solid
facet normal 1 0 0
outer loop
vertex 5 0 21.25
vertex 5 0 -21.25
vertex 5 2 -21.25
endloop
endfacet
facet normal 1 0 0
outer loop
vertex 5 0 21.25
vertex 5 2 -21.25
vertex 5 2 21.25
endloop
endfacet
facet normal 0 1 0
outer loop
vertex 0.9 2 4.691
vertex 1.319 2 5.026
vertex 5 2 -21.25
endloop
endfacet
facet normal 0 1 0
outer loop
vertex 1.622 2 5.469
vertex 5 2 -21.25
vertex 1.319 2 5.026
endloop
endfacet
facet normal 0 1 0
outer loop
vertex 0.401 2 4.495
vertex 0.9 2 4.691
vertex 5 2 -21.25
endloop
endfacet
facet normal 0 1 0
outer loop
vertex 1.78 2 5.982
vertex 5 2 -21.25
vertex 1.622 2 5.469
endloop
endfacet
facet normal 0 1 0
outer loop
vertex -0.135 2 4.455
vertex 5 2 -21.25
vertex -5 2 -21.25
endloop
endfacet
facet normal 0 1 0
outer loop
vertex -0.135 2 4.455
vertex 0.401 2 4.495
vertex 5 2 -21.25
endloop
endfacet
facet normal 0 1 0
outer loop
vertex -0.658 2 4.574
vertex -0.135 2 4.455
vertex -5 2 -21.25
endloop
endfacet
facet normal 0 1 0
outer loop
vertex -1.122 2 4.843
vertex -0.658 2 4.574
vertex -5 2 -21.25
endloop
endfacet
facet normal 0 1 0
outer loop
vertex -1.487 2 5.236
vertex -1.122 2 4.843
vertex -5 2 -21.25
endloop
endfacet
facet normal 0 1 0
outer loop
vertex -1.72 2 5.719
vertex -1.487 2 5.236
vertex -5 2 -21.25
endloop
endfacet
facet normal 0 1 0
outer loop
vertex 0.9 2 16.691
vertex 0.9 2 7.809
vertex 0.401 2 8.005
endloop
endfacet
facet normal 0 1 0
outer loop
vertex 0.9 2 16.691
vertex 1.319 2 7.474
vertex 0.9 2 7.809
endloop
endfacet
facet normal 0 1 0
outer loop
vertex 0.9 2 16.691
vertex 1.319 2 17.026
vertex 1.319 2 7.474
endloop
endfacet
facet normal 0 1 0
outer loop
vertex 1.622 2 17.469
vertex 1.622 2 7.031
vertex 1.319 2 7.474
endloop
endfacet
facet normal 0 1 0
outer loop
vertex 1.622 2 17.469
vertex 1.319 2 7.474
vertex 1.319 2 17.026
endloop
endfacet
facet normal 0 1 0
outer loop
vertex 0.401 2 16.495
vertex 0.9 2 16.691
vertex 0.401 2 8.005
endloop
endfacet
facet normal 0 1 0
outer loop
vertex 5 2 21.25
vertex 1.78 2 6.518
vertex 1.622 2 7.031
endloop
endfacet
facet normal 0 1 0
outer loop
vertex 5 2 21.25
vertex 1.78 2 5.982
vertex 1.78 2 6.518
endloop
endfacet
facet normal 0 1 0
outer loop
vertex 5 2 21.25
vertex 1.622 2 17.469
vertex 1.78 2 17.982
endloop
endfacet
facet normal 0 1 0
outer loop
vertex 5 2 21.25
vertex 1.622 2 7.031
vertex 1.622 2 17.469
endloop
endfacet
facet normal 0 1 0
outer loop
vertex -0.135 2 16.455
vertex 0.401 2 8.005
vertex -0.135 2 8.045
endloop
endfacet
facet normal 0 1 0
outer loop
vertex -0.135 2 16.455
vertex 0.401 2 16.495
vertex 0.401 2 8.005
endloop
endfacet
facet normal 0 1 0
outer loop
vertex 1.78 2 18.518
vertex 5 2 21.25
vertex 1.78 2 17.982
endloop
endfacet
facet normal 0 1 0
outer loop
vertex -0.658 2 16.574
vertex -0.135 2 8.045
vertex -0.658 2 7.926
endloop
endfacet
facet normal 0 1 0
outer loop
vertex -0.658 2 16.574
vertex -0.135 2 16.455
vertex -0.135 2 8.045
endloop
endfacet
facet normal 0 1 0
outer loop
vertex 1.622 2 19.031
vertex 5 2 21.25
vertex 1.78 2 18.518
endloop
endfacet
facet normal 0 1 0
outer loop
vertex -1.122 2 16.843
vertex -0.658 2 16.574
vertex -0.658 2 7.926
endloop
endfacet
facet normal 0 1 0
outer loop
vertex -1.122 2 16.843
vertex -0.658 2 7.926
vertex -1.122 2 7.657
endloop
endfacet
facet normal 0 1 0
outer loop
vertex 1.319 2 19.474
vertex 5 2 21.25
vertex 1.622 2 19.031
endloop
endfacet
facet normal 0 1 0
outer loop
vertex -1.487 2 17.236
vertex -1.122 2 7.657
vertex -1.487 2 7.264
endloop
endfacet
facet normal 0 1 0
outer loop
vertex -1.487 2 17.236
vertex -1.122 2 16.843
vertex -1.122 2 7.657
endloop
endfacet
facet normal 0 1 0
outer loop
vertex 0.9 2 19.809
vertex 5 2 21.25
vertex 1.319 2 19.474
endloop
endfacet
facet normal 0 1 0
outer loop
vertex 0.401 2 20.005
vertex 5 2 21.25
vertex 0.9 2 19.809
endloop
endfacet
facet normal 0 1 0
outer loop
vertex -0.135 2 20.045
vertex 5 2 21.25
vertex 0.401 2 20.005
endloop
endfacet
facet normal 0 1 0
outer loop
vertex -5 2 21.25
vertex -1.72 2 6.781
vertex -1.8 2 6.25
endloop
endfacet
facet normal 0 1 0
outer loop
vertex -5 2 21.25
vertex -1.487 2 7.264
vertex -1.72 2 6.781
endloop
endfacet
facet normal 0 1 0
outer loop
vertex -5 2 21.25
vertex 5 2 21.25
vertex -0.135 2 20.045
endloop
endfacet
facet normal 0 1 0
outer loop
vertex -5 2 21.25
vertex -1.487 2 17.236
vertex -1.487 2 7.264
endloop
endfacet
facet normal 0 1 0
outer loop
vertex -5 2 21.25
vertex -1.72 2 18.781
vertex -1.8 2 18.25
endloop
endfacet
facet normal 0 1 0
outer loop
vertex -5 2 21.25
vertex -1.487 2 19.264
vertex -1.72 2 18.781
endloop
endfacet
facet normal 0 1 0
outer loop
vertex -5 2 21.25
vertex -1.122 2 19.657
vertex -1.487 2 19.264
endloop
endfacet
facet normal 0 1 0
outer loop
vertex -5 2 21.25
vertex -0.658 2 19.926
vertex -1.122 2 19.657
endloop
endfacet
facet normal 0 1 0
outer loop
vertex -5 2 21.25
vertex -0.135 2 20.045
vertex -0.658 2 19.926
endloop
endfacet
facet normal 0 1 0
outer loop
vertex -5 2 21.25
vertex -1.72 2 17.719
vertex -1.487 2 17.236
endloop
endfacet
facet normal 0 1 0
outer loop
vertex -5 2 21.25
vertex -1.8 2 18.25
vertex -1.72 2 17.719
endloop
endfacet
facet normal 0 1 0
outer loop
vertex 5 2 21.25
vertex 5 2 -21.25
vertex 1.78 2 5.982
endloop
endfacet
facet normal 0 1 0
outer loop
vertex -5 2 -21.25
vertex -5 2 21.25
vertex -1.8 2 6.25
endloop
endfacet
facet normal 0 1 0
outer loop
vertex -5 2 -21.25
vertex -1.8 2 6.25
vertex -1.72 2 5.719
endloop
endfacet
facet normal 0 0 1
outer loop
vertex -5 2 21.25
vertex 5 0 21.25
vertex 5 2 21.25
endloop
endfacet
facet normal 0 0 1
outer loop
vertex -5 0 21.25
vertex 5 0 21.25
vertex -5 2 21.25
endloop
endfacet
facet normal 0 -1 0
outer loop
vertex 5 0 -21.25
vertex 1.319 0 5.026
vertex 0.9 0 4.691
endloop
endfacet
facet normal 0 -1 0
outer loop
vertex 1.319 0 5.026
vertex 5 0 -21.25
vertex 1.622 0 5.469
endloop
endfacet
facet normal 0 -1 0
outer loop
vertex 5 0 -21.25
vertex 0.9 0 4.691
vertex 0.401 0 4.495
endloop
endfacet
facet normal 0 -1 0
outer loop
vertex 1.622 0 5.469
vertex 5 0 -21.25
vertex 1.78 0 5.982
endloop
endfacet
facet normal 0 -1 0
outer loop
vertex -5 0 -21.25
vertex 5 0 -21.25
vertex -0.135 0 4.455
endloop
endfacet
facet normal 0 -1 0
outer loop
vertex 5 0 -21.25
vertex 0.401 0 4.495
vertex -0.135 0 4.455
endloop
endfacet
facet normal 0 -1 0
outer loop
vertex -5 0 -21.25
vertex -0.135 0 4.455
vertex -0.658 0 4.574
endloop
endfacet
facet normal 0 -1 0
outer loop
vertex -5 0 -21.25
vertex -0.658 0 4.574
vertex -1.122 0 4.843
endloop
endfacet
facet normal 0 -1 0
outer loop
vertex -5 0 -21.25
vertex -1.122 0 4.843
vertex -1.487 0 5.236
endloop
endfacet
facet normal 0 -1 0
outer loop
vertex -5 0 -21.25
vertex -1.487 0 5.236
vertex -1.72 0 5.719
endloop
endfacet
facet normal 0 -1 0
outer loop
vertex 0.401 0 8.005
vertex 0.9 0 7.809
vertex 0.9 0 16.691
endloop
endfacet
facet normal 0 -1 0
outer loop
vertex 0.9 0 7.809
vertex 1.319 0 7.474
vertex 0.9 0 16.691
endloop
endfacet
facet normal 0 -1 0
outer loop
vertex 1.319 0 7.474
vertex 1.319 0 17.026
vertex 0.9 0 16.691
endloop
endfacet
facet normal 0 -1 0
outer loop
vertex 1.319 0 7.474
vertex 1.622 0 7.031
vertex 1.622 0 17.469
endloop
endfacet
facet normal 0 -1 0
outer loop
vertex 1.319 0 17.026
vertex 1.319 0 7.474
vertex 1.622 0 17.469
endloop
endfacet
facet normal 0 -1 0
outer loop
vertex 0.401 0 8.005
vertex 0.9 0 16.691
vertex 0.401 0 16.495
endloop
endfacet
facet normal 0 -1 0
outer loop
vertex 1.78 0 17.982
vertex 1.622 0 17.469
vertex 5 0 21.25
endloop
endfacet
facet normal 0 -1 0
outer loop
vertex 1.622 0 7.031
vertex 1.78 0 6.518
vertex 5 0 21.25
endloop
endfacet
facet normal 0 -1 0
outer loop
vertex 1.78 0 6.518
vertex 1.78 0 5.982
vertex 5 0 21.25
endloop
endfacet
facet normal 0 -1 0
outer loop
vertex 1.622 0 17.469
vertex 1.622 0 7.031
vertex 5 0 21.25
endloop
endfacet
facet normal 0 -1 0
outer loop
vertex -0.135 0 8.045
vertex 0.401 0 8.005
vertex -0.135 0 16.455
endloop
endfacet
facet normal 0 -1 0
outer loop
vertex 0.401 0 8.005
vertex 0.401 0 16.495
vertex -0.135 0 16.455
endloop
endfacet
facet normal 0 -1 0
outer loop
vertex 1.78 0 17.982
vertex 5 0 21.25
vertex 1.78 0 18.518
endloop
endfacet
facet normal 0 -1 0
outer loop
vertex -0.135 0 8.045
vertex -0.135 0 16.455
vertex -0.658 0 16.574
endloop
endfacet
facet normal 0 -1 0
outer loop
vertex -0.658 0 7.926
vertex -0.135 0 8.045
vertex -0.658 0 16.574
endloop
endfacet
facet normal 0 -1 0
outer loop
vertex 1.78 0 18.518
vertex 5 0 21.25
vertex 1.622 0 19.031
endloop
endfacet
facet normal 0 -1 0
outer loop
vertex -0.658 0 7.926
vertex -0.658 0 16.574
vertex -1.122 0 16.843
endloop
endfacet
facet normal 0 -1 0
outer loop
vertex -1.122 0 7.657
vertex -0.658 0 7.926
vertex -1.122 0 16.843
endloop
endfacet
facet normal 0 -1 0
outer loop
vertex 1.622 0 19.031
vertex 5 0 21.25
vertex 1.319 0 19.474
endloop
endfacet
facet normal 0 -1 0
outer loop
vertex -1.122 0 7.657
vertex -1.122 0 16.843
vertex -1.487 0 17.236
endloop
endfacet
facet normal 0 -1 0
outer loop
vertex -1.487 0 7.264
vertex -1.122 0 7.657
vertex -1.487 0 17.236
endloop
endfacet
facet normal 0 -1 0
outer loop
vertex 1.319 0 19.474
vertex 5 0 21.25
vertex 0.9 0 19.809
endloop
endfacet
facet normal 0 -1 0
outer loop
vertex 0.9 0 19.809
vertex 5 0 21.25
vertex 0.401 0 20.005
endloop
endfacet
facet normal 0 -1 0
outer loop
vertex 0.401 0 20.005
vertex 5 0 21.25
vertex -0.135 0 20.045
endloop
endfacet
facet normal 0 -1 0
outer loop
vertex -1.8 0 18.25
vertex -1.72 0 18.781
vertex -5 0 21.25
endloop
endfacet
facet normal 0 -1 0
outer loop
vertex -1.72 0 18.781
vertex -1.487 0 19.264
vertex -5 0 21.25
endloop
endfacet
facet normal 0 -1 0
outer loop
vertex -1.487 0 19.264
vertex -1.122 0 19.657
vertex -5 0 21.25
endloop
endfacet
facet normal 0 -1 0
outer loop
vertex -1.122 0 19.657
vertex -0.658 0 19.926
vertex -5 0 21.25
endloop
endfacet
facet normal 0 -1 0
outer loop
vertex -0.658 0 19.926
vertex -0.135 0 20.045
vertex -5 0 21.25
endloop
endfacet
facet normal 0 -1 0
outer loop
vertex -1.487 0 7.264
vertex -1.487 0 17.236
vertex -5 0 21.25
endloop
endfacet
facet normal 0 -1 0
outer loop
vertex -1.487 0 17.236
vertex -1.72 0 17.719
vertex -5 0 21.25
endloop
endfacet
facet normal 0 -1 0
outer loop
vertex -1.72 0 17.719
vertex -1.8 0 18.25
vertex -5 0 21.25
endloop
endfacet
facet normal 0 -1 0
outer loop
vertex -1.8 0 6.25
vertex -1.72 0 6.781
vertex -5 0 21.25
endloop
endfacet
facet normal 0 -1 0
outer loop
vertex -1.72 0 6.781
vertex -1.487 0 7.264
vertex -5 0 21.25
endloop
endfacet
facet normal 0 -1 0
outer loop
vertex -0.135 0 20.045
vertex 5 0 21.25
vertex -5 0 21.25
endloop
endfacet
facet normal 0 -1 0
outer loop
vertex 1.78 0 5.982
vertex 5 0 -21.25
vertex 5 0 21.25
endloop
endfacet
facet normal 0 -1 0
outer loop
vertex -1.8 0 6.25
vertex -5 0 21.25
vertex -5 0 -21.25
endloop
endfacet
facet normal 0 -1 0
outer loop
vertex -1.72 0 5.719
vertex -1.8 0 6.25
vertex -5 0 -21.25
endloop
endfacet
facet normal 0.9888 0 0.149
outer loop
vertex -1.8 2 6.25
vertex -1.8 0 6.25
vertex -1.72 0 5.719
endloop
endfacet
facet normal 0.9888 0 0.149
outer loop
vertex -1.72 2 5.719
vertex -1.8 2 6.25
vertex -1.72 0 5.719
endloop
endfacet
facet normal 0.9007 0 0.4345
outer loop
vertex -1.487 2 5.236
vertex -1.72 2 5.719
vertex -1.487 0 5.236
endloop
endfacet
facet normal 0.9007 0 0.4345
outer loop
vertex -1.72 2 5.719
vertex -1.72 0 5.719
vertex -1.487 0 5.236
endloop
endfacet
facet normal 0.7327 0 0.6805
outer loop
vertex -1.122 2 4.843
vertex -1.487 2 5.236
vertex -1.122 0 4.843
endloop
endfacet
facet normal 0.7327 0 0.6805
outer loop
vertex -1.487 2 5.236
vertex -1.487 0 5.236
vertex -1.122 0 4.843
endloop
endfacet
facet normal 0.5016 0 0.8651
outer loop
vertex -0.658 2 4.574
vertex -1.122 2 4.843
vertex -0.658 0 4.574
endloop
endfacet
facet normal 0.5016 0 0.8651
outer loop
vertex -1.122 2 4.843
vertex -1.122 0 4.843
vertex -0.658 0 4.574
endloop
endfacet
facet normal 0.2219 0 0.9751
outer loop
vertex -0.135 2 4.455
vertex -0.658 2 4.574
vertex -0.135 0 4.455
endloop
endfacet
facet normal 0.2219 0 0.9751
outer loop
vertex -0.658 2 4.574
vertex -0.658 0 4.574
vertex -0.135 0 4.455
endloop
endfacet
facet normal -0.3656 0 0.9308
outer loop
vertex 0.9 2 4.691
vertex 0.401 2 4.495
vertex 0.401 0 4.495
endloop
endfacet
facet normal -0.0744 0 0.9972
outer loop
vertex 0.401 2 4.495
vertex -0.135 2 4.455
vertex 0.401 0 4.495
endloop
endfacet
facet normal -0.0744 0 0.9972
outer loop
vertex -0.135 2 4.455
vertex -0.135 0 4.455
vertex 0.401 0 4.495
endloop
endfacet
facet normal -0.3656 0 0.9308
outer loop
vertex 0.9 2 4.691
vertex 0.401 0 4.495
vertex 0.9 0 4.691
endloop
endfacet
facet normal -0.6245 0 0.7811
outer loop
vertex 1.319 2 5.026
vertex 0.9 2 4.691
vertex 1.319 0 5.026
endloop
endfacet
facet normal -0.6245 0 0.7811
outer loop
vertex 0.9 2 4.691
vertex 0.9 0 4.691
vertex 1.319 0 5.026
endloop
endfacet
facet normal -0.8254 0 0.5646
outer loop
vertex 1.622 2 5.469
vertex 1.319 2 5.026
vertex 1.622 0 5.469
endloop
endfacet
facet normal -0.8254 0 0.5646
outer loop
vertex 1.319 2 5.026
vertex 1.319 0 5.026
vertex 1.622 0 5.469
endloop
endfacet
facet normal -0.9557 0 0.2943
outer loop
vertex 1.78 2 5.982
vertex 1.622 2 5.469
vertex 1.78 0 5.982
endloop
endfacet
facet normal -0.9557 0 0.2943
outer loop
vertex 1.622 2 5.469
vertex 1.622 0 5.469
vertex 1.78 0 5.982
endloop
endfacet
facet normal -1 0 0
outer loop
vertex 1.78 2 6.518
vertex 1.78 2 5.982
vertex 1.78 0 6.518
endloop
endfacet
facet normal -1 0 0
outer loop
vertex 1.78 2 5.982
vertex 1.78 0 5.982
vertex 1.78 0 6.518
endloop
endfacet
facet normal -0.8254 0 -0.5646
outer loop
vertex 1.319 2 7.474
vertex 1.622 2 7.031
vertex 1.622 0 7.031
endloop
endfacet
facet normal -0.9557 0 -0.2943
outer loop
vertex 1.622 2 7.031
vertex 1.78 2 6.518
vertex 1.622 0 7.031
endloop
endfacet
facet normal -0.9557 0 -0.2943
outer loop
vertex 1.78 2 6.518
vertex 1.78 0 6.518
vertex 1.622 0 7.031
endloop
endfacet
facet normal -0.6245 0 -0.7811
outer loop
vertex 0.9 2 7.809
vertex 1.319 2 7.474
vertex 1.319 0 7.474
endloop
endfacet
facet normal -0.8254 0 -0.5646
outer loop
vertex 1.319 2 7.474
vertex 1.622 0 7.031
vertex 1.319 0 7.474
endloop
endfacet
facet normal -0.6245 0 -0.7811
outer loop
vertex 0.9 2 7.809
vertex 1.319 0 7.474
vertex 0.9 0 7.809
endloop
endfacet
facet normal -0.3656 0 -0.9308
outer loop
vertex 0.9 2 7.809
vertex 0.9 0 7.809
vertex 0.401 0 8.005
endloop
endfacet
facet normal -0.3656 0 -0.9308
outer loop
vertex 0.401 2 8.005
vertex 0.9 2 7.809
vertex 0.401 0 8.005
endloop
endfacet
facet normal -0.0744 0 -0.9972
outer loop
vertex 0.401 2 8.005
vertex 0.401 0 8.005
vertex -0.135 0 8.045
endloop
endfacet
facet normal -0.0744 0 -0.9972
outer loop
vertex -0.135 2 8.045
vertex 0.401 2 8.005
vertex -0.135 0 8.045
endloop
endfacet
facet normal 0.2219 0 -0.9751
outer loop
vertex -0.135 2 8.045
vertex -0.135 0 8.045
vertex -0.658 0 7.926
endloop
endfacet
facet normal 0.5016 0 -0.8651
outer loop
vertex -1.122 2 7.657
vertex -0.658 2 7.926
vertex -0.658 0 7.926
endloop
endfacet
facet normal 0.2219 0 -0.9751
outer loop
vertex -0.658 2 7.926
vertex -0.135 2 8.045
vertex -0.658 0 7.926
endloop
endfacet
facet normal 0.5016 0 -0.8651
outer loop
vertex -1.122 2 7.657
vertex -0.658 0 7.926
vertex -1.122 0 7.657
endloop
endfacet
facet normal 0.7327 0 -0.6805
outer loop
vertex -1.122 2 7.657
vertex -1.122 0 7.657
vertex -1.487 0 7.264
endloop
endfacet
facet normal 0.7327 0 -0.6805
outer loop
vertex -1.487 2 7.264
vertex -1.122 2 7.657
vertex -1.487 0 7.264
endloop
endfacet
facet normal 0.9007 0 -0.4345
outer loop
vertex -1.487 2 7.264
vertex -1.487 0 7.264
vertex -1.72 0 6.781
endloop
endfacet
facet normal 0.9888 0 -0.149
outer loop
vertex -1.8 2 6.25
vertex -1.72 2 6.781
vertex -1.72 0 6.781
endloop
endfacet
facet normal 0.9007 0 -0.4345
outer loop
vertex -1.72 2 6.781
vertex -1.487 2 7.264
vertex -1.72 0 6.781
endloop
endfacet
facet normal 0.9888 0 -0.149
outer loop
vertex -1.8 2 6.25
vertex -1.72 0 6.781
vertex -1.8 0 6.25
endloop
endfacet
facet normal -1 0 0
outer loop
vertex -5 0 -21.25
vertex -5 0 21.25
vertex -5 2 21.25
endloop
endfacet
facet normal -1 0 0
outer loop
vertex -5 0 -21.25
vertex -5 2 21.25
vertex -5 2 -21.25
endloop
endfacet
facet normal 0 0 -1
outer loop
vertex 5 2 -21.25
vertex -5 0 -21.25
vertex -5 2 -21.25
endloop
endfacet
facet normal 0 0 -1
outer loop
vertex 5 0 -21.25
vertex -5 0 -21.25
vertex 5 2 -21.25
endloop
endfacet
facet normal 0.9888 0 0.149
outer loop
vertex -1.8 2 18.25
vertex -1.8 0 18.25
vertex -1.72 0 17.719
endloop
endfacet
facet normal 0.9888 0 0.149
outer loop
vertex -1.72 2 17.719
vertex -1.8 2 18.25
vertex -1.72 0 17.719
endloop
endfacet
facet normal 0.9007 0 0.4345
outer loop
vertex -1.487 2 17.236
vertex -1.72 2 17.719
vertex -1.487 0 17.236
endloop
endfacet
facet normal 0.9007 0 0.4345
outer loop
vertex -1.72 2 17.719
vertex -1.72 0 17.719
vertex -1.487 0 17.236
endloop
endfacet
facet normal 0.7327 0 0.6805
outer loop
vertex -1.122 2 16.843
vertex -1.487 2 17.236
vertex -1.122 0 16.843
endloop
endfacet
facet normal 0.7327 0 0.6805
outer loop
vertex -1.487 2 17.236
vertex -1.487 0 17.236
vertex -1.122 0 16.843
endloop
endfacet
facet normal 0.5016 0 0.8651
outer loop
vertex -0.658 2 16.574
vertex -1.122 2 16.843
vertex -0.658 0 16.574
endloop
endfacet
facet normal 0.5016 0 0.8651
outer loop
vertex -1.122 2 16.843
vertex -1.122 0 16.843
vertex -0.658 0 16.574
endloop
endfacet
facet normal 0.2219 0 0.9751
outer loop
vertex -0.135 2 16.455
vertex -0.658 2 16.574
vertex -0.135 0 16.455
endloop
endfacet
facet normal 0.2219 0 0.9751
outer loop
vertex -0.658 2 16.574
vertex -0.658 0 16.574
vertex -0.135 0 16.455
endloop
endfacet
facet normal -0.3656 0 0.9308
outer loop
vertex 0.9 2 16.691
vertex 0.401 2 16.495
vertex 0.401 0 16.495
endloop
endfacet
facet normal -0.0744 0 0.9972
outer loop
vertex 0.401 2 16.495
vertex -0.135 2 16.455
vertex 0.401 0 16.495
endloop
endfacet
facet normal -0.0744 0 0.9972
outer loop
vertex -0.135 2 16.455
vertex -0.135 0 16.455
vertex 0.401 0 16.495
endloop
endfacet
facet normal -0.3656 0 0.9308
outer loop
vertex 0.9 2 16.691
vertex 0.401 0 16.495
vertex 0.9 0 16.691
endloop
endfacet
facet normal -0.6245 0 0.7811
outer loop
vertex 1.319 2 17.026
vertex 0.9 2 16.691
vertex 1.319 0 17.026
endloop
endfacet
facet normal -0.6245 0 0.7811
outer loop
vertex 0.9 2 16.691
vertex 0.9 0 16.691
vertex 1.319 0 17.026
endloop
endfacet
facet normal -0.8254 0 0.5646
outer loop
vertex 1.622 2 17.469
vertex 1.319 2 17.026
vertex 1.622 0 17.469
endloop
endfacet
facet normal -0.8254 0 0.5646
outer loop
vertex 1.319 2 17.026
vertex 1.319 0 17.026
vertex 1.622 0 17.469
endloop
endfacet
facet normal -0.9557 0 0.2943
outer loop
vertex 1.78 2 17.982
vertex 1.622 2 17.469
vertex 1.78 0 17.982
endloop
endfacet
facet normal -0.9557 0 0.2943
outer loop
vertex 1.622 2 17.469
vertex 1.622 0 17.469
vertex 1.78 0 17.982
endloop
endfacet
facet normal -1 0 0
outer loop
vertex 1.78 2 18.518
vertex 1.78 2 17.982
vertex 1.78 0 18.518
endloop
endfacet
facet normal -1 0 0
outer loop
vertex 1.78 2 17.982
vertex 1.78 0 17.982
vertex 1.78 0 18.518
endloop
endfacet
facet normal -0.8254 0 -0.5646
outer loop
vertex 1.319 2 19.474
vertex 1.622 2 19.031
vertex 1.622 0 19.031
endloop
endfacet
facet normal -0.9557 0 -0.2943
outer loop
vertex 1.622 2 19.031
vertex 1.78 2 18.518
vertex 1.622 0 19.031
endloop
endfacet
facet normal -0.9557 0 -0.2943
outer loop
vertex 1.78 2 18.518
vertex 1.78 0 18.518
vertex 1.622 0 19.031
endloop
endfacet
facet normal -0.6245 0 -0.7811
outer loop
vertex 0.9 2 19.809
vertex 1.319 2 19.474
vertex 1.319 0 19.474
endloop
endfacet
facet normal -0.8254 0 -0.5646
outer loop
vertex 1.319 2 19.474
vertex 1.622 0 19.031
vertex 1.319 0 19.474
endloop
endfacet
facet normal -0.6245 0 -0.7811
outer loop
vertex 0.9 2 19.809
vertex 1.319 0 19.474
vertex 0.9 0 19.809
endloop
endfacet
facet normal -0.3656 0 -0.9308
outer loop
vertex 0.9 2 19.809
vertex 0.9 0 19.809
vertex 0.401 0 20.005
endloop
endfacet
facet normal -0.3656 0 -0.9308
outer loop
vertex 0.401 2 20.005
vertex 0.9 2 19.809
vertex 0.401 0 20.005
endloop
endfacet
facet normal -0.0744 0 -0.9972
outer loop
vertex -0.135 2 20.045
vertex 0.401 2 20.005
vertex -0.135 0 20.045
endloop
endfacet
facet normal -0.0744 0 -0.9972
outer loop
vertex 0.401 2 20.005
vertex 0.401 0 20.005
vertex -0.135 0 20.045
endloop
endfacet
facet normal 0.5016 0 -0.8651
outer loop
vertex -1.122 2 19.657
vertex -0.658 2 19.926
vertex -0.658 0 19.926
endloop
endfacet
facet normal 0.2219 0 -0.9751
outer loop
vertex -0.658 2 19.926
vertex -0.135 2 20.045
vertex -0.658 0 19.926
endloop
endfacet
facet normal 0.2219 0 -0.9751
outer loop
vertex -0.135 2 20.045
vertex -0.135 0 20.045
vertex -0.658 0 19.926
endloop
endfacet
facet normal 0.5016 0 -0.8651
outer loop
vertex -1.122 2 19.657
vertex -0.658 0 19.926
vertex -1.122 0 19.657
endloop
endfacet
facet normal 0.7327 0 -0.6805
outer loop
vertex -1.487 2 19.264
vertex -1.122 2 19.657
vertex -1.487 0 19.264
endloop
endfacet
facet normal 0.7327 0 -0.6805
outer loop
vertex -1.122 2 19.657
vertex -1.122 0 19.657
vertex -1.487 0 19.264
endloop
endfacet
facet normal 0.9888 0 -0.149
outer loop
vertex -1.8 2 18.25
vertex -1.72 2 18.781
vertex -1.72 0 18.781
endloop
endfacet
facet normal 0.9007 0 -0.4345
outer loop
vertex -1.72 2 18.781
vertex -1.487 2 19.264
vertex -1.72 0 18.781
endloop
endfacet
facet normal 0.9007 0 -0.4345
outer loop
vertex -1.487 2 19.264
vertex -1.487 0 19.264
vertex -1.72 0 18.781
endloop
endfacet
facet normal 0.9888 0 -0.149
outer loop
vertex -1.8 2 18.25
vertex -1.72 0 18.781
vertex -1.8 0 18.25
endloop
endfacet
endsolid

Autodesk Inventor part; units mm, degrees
ref_plane "YZ Plane" through (0, 0, 0) normal (1, 0, 0) x (0, 1, 0)
ref_plane "XZ Plane" through (0, 0, 0) normal (0, 1, 0) x (-1, 0, 0)
ref_plane "XY Plane" through (0, 0, 0) normal (0, 0, 1) x (1, 0, 0)
sketch "Sketch1" plane through (0, 0, 0) normal (0, 1, 0) x (-1, 0, 0)
  line L0 (-5, 21.25) -> (5, 21.25)
  line L1 (5, 21.25) -> (5, -21.25)
  line L2 (5, -21.25) -> (-5, -21.25)
  line L3 (-5, -21.25) -> (-5, 21.25)
  line L4 (-5, 21.25) -> (5, -21.25) construction
  line L5 (5, 21.25) -> (-5, -21.25) construction
  circle A0 centre (0, 6.25) radius 1.8
  circle A1 centre (0, 18.25) radius 1.8
  point P0 (0, 0)
  dimension "d0" = 42.5
  dimension "d1" = 10
  dimension "d4" = 15
  dimension "d5" = 3.6
  dimension "d27" = 3.6
  dimension "d28" = 3
extrude "Extrusion1" add sketch "Sketch1" along normal blind 2
sketch "Sketch2" plane through (0, 2, 0) normal (0, 1, 0) x (1, 0, 0)
  line L0 (-5.1166, 21.6617) -> (4.9098, 21.6617) construction
  line L1 (4.9098, 21.6617) -> (4.9098, -21.1785) construction
  line L2 (4.9098, -21.1785) -> (-5.1166, -21.1785) construction
  line L3 (-5.1166, -21.1785) -> (-5.1166, 21.6617) construction
  point P0 (0, 0)
decal "Decal1"
properties part number "sensorInferior"
